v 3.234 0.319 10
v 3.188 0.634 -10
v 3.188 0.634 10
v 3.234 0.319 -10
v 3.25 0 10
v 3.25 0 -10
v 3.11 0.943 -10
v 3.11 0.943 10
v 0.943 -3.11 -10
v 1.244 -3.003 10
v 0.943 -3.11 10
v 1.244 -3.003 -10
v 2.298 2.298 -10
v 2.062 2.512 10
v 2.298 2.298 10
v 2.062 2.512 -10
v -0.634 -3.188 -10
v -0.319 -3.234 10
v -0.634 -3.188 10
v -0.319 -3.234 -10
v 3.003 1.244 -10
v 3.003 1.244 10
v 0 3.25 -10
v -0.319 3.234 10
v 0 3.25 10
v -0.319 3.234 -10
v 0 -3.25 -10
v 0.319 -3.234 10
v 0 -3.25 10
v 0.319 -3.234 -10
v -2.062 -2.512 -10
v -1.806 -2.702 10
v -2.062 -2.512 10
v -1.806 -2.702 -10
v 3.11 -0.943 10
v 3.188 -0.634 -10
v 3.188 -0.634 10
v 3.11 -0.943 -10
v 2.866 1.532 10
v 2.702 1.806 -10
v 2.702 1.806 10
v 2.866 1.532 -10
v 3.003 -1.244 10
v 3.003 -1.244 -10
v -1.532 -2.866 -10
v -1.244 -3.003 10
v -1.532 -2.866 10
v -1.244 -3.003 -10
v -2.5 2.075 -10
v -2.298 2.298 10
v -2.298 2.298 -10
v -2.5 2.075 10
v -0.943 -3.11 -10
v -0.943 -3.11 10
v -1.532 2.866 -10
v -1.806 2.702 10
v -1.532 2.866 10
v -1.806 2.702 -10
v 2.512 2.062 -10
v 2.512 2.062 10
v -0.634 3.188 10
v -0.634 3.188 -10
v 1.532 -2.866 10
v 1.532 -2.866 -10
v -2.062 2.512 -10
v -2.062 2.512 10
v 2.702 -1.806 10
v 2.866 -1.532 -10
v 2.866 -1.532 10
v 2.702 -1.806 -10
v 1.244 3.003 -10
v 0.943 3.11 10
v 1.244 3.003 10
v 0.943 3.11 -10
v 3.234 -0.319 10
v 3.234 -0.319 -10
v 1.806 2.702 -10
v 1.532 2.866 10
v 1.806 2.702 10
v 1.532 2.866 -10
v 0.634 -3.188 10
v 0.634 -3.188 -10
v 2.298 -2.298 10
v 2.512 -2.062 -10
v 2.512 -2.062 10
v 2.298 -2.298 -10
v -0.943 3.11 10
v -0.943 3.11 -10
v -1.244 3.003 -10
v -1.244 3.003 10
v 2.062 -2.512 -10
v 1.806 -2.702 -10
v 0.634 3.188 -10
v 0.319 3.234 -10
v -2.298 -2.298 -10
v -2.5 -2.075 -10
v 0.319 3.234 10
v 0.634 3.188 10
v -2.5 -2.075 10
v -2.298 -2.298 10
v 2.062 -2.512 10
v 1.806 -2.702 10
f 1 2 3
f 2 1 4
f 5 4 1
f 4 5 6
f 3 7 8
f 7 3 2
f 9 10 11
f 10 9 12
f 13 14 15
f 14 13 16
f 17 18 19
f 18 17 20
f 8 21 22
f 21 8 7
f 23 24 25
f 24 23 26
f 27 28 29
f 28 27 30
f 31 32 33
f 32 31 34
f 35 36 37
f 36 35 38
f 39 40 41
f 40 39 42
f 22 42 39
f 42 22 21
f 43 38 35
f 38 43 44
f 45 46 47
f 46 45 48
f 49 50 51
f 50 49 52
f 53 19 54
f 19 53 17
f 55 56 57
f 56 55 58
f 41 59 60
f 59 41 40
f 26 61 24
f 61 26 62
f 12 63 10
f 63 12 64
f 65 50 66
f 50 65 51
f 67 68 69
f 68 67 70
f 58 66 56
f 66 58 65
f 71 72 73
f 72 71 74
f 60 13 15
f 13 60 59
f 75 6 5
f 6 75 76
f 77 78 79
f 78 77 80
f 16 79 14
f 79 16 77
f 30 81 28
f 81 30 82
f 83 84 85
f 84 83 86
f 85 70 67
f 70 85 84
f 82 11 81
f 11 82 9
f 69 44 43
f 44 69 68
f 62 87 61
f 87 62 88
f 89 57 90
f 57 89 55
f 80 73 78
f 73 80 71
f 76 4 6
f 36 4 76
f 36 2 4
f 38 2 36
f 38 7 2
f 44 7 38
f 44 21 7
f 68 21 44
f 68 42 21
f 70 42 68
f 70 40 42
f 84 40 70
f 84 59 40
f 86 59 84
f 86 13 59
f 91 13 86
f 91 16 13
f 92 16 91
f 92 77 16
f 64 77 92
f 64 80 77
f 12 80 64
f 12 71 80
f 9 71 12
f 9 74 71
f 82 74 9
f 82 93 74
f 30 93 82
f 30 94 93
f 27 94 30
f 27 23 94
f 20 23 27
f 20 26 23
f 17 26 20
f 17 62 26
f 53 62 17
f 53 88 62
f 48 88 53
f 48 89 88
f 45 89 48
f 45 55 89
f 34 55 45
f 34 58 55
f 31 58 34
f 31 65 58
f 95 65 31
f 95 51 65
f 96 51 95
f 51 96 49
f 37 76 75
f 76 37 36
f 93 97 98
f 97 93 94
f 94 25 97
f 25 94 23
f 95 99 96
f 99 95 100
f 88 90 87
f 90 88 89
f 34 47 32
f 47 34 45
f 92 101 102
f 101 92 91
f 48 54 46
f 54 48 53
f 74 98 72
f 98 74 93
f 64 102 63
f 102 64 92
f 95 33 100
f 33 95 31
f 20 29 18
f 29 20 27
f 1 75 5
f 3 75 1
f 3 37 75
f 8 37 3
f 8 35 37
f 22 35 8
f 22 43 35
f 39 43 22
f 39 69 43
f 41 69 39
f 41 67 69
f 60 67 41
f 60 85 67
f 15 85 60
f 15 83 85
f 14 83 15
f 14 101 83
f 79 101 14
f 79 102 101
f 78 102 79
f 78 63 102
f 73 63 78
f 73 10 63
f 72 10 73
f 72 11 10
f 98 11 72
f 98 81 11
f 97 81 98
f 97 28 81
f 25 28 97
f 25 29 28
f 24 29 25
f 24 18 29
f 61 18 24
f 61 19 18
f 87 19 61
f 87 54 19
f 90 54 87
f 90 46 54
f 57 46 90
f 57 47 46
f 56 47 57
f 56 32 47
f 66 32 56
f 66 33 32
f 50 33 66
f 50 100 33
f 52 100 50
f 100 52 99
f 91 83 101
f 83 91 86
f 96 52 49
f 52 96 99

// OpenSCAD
// file: dimensions.scad
panel_thickness = 5;

bezel_width = 140;
bezel_height = 85;
bezel_corner_radius = 3;
bezel_screw_hole_dia = 3.5;
bezel_angle = 70; // degrees

tab_tolerance_coeff = 1.025;
tab_width = 15;

floor_width = bezel_width - (panel_thickness * 4);
floor_depth = 120;
floor_height_above_bottom = 10; 

sma_bulkhead_radius = 3.25;
sma_bulkhead_flat_radius = 3;

roof_width = 100;
roof_depth = 80;
roof_height_below_top = 5; 

side_height = 100;
side_depth  = floor_depth;
side_corner_radius = 1.5;
chin_depth = 42;


// Pi standoff holes
// All measurements taken from https://www.raspberrypi.org/documentation/hardware/raspberrypi/mechanical/rpi_MECH_3bplus.pdf
// Top left etc relative to drawing
// 0,0 of drawing is bottom left corner

pi_width = 85;
pi_depth = 56;
pi_hole_dia = 2.75;
pi_hole_radius = pi_hole_dia / 2;
standoff_dia = pi_hole_dia * 2;
standoff_radius = standoff_dia / 2;
standoff_height = 3;
pi_standoff_holes = [
    [3.5, 3.5],           // bottom left
    [3.5+58, 3.5],      // bottom right
    [3.5, 3.5+49],      // top left
    [3.5+58, 3.5+49], // top right
];


m3_bolt_thread_len = 8;
m3_bolt_dia = 3;
m3_bolt_clearance_coeff = 1.02;
m3_bolt_slot_dia = m3_bolt_dia * m3_bolt_clearance_coeff;
m3_bolt_slot_len = m3_bolt_thread_len + 1;
m3_nut_flats_dia = 5.5;
m3_nut_clearance_coeff = 1.025;
m3_nut_points_dia = 6;
m3_nut_depth = 2.5;
m3_nut_slot_width = ((m3_nut_flats_dia * m3_nut_clearance_coeff) - m3_bolt_slot_dia) * 2;
m3_nut_slot_depth = m3_nut_depth * m3_nut_clearance_coeff;
   
// main file
$fn = 64;

include <dimensions.scad>;

module sma_bulkhead_profile() {
    difference() {
        translate([0, 0, -panel_thickness*2]) 
            cylinder(r=sma_bulkhead_radius, h=panel_thickness*4);
        translate([-(sma_bulkhead_flat_radius+1.5), -5, -11]) 
            cube([2, 10, panel_thickness*5]);
    }
}

sma_bulkhead_profile();
